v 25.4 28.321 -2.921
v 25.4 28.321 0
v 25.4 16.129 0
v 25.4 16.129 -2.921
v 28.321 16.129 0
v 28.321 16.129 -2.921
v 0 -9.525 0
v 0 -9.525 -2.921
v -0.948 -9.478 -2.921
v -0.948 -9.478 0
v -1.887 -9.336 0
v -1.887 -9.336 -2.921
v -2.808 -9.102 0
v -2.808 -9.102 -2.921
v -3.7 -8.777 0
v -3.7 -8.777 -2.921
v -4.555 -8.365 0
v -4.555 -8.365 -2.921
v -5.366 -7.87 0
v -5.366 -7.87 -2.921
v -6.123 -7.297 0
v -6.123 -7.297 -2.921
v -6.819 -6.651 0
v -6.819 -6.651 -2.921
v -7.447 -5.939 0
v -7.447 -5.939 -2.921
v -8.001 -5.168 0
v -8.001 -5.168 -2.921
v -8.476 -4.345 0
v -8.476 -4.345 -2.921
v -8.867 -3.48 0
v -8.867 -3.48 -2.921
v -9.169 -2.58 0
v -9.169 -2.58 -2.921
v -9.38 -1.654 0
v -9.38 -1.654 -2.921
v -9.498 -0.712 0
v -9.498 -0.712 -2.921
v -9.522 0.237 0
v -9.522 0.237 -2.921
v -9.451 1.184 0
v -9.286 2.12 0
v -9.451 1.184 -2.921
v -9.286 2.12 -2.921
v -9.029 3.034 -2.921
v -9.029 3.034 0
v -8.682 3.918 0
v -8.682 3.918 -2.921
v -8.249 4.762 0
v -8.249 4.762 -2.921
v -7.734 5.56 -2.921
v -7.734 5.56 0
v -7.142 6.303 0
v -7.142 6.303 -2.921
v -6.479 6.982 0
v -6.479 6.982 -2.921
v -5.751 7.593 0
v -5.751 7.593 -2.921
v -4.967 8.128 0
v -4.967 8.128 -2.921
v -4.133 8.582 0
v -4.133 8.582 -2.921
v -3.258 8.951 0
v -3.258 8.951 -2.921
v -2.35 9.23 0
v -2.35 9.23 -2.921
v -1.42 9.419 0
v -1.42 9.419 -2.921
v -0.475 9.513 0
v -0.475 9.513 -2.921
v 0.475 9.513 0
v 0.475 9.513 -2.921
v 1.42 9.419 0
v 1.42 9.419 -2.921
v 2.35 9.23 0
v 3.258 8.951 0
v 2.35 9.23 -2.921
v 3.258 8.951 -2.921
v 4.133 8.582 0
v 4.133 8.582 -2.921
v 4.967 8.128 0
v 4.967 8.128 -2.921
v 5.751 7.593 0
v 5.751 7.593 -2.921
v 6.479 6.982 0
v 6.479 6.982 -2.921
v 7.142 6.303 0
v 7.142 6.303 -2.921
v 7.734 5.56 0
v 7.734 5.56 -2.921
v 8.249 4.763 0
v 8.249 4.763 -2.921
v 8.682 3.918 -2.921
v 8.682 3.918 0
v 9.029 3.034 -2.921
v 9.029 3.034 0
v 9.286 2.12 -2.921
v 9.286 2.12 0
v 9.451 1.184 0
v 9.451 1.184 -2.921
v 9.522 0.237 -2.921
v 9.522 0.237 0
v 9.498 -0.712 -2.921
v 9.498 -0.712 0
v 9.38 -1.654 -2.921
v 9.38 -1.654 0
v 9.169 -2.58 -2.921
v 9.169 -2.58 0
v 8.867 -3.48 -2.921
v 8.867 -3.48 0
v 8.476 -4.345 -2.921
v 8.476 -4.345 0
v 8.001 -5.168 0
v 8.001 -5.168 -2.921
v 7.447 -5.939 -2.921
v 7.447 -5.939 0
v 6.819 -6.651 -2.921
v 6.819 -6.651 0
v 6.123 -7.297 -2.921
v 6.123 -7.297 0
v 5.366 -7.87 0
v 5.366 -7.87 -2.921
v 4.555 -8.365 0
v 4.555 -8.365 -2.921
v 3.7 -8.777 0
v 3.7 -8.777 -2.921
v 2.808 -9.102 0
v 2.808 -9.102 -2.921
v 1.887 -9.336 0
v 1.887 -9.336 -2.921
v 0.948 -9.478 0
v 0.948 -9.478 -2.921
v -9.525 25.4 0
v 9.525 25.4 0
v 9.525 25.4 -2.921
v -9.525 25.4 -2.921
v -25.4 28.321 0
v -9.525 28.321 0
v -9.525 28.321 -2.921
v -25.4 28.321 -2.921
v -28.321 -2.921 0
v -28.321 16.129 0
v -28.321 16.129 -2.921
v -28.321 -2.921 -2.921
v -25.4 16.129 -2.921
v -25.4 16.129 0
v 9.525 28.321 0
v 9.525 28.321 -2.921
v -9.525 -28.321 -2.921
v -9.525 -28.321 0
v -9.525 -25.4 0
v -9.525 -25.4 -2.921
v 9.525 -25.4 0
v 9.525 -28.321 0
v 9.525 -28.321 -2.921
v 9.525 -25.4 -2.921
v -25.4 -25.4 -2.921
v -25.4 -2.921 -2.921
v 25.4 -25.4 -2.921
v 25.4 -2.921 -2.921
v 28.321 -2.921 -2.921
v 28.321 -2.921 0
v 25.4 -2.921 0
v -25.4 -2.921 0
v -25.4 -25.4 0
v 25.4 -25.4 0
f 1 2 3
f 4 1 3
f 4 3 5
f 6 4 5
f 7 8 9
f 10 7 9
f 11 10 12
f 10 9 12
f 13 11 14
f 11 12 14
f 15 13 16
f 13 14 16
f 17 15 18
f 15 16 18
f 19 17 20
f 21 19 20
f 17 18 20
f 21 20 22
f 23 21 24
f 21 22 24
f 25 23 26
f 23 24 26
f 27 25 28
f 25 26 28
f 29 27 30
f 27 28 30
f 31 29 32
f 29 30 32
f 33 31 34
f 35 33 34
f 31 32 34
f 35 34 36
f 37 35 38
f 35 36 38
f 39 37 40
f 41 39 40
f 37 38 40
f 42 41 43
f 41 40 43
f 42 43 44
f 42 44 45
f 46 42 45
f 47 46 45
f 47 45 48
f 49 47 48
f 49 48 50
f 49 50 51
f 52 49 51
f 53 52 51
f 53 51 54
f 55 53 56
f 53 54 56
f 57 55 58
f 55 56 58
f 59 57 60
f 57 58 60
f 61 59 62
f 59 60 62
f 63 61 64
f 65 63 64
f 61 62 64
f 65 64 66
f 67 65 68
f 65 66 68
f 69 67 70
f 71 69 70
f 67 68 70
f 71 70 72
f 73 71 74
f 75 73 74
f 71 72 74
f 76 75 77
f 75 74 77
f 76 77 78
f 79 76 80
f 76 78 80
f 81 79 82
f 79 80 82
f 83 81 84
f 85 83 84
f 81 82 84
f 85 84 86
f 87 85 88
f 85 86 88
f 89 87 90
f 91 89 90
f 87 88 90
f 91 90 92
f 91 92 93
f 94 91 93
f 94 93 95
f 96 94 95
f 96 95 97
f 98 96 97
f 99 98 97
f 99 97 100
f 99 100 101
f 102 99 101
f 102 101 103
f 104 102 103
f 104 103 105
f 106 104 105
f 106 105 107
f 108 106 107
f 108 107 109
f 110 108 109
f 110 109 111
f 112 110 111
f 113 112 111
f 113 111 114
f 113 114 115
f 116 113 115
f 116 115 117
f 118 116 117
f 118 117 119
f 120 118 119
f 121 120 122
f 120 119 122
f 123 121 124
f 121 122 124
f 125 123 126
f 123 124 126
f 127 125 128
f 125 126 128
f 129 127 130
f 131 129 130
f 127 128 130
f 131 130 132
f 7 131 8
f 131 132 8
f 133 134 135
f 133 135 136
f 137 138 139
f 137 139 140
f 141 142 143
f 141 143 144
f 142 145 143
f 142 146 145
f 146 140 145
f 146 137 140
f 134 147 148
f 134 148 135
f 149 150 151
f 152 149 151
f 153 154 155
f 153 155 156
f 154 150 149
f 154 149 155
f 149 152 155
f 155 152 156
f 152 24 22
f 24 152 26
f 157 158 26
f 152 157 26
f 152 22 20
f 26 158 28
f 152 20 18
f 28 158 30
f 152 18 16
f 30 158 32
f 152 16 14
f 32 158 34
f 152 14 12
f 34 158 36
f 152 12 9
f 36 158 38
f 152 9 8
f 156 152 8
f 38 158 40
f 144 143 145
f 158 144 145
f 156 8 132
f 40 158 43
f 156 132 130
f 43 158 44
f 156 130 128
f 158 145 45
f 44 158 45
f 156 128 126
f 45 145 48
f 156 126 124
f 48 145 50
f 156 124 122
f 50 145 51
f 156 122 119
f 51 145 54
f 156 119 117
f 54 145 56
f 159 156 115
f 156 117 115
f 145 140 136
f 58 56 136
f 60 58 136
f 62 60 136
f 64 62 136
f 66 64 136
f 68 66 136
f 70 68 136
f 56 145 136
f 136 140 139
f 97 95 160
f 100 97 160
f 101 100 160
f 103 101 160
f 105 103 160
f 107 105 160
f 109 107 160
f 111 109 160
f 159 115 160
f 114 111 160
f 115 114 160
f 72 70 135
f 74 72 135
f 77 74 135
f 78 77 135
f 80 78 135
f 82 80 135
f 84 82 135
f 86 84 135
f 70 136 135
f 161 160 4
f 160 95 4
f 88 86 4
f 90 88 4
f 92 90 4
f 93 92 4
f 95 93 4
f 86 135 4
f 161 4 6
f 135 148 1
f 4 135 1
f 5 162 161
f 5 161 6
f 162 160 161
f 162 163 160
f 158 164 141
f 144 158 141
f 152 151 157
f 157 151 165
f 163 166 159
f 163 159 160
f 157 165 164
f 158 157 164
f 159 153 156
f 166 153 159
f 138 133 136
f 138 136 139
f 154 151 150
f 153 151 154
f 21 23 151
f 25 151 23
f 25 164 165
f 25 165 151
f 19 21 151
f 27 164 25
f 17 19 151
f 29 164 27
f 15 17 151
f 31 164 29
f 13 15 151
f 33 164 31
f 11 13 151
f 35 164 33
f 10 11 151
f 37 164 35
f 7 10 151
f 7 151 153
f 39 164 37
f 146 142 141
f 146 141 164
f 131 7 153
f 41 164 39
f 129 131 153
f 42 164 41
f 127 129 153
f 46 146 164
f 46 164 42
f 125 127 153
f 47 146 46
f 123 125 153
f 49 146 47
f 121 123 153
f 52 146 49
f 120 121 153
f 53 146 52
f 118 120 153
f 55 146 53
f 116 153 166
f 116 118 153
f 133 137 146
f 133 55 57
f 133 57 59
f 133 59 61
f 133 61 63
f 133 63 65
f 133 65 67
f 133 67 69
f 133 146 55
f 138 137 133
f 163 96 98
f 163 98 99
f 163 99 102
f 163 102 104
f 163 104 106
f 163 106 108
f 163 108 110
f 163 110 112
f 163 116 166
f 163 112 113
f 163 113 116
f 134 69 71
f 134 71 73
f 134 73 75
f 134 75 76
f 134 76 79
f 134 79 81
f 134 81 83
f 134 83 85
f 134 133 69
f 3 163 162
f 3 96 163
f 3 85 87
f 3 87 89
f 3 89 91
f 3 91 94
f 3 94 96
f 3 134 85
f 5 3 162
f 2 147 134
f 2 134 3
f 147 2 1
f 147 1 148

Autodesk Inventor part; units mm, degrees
ref_plane "YZ Plane" through (0, 0, 0) normal (1, 0, 0) x (0, 1, 0)
ref_plane "XZ Plane" through (0, 0, 0) normal (0, 1, 0) x (-1, 0, 0)
ref_plane "XY Plane" through (0, 0, 0) normal (0, 0, 1) x (1, 0, 0)
sketch "Sketch1" plane through (0, 0, 0) normal (0, 0, 1) x (1, 0, 0)
  line L0 (-28.321, -28.321) -> (28.321, -28.321)
  line L1 (28.321, -28.321) -> (28.321, 28.321)
  line L2 (28.321, 28.321) -> (-28.321, 28.321)
  line L3 (-28.321, 28.321) -> (-28.321, -28.321)
  line L4 (-28.321, -28.321) -> (28.321, 28.321) construction
  line L5 (28.321, -28.321) -> (-28.321, 28.321) construction
  point P0 (0, 0)
  dimension "d0" = 56.642
  dimension "d1" = 56.642
extrude "Extrusion1" add sketch "Sketch1" against normal blind 2.921
sketch "Sketch4" plane through (0, 0, 0) normal (0, 0, 1) x (1, 0, 0)
  line L0 (-28.321, -28.321) -> (-9.525, -28.321)
  line L1 (-9.525, -28.321) -> (-9.525, -25.4)
  line L2 (-9.525, -25.4) -> (-28.321, -25.4)
  line L3 (-28.321, -25.4) -> (-28.321, -28.321)
  line L4 (28.321, 28.321) -> (-28.321, 28.321) projected
  line L5 (-28.321, 28.321) -> (-28.321, -28.321) projected
  line L6 (-9.525, 28.321) -> (9.525, 28.321)
  line L7 (9.525, 28.321) -> (9.525, 25.4)
  line L8 (9.525, 25.4) -> (-9.525, 25.4)
  line L9 (-9.525, 25.4) -> (-9.525, 28.321)
  line L10 (-28.321, -28.321) -> (-25.4, -28.321)
  line L11 (-25.4, -28.321) -> (-25.4, -2.921)
  line L12 (-25.4, -2.921) -> (-28.321, -2.921)
  line L13 (-28.321, -2.921) -> (-28.321, -28.321)
  line L14 (-28.321, 28.321) -> (-25.4, 28.321)
  line L15 (-25.4, 28.321) -> (-25.4, 16.129)
  line L16 (-25.4, 16.129) -> (-28.321, 16.129)
  line L17 (-28.321, 16.129) -> (-28.321, 28.321)
  line L18 (0, -3.175) -> (0, -6.3407)
  line L19 (28.321, -28.321) -> (9.525, -28.321)
  line L20 (9.525, -28.321) -> (9.525, -25.4)
  line L21 (9.525, -25.4) -> (28.321, -25.4)
  line L22 (28.321, -25.4) -> (28.321, -28.321)
  line L23 (28.321, 28.321) -> (28.321, -28.321)
  line L24 (9.525, 25.4) -> (9.525, 28.321)
  line L25 (28.321, -28.321) -> (25.4, -28.321)
  line L26 (25.4, -28.321) -> (25.4, -2.921)
  line L27 (25.4, -2.921) -> (28.321, -2.921)
  line L28 (28.321, -2.921) -> (28.321, -28.321)
  line L29 (28.321, 28.321) -> (25.4, 28.321)
  line L30 (25.4, 28.321) -> (25.4, 16.129)
  line L31 (25.4, 16.129) -> (28.321, 16.129)
  line L32 (28.321, 16.129) -> (28.321, 28.321)
  line L33 (-28.321, -28.321) -> (28.321, -28.321) projected
  point P0 (0, 0)
  point P1 (28.321, 0.1976)
  dimension "d16" = 2.921
  dimension "d37" = 9.525
  dimension "d38" = 18.796
  dimension "d44" = 2.921
  dimension "d45" = 19.05
  dimension "d46" = 18.796
  dimension "d53" = 25.4
  dimension "d54" = 19.05
  dimension "d55" = 2.921
  dimension "d56" = 2.921
  dimension "d57" = 12.192
  dimension "d58" = 18.796
  dimension "d59" = 19.05
  dimension "d60" = 12.192
  dimension "d61" = 19.05
  dimension "d62" = 25.4
extrude "Extrusion5" cut sketch "Sketch4" against normal blind 25.4 contours L3 L2 L11 L0 | L11 L2 L1 L0 | L5 L12 L11 L2 | L20 L21 L26 L19 | L5 L4 L15 L16 | L26 L21 L22 L19 | L26 L27 L23 L21 | L4 L7 L8 L9 | L31 L30 L4 L23
hole "Hole1" at (0, 0, 0) direction (0, 0, -1) diameter 19.05 end through all
equation "\"d1\" = d0"
equation "\"d38\" = -d37 + 0.5 * d0"
equation "\"d44\" = d16"
equation "\"d45\" = d42"
equation "\"d46\" = d38"
equation "\"d55\" = d16"
equation "\"d56\" = d16"
equation "\"d59\" = d45"
equation "\"d19\" = 0.5 * d0"
equation "\"d48\" = 0.5 * d0"
equation "\"d42\" = 2 * d37"
properties part number "SideB"
